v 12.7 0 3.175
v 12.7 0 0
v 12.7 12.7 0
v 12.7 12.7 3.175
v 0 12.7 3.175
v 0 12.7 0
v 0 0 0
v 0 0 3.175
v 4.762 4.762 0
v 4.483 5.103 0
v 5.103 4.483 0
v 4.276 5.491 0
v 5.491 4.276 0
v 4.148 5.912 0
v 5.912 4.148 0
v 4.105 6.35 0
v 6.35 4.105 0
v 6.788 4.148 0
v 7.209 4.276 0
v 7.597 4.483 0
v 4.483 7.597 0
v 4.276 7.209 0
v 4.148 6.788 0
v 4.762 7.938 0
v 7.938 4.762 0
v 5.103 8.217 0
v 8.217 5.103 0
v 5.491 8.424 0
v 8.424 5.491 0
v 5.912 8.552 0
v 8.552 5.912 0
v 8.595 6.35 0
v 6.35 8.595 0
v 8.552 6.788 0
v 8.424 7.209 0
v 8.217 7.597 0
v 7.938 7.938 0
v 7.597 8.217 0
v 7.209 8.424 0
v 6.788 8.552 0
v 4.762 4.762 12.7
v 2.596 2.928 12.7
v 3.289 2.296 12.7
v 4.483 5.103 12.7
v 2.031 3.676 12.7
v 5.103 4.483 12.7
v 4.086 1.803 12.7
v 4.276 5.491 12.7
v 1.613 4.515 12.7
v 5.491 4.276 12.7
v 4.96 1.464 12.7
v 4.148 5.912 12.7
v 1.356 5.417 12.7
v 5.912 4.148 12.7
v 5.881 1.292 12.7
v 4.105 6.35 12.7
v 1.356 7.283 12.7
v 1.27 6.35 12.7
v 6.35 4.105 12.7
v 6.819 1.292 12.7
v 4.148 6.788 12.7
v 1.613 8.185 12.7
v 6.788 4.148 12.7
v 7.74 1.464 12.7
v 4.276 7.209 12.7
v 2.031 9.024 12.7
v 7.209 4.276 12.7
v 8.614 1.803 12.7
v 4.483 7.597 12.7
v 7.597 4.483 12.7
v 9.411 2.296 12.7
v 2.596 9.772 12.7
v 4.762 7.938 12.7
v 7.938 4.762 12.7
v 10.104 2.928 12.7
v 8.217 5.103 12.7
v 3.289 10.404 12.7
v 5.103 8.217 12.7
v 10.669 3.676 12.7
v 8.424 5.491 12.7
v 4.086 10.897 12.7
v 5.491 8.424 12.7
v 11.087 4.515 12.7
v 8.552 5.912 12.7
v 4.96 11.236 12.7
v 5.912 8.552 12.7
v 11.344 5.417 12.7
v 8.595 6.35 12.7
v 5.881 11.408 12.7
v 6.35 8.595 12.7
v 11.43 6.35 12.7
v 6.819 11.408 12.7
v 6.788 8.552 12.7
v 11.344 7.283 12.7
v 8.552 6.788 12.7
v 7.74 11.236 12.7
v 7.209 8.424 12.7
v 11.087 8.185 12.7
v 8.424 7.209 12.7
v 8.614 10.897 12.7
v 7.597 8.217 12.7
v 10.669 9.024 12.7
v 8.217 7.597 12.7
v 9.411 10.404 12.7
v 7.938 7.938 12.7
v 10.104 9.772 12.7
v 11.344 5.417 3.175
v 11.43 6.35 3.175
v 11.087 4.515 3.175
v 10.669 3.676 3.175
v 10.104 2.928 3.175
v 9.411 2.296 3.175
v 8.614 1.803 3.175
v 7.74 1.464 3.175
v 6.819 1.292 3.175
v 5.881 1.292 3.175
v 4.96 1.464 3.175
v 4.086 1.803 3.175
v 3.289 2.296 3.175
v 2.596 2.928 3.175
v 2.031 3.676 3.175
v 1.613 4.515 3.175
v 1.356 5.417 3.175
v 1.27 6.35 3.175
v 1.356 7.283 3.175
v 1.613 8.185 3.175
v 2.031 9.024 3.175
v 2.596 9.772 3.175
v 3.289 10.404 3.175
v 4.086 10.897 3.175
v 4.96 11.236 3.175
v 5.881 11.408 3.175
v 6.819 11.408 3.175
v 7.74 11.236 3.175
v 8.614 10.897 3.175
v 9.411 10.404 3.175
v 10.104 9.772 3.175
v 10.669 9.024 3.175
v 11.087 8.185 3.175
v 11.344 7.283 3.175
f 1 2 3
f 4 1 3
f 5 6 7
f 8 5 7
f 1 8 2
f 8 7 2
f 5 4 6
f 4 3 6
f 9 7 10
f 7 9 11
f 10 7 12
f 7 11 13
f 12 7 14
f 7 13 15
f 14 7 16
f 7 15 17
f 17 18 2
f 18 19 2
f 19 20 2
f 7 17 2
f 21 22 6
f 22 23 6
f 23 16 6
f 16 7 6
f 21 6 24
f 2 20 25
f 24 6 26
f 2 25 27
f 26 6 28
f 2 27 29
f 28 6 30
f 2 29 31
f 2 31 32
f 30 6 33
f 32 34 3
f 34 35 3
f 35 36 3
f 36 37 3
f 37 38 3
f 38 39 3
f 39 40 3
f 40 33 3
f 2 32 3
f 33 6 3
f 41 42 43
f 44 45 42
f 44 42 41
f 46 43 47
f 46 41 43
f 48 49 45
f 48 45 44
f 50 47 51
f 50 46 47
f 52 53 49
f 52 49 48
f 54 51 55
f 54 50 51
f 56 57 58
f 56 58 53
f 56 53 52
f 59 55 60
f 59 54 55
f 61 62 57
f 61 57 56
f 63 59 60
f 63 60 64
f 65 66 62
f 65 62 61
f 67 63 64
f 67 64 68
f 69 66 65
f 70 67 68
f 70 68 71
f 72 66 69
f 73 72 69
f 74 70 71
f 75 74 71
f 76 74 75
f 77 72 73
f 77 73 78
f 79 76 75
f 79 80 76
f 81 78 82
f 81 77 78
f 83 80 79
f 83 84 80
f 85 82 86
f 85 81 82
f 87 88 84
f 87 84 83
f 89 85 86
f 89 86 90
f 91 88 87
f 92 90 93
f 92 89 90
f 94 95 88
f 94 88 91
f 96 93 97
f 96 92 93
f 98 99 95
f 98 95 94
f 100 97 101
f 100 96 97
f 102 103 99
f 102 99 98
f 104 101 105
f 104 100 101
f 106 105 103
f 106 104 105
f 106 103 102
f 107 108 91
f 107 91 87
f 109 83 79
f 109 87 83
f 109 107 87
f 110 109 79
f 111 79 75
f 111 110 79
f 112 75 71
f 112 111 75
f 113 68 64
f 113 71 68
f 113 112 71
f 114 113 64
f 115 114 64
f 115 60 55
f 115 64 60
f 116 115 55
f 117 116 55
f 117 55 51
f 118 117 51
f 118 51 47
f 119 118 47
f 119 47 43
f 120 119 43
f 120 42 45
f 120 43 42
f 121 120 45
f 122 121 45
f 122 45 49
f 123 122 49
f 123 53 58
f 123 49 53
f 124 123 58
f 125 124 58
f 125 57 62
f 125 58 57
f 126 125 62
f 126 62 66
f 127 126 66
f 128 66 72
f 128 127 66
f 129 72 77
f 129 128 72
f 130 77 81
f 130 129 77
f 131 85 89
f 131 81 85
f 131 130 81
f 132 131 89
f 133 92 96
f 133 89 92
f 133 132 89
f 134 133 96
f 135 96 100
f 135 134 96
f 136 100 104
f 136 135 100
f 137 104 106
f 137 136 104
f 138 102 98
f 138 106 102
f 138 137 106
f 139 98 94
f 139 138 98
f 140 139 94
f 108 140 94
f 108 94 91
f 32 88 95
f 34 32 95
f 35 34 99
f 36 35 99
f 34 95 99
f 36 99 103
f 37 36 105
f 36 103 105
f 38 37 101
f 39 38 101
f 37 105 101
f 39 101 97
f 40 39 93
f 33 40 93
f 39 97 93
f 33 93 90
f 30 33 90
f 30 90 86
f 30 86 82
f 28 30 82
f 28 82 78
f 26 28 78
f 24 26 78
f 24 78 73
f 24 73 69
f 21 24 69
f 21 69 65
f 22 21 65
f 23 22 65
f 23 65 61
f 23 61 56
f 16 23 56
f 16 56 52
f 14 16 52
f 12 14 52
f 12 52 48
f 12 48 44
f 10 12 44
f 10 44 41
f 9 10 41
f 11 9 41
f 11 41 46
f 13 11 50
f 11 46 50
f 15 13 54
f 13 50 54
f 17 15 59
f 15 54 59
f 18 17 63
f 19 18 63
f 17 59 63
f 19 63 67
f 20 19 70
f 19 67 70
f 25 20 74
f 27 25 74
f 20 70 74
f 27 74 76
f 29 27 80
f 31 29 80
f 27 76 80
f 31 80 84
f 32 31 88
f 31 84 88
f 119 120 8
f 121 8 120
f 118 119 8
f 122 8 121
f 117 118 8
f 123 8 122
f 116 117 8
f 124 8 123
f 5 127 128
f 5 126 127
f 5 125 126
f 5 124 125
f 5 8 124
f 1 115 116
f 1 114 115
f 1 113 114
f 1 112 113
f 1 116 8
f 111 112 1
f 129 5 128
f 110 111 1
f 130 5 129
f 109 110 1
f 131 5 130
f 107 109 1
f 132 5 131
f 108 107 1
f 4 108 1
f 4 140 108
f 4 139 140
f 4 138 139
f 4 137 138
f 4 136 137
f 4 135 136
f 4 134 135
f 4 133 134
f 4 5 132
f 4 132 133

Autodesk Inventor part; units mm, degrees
ref_plane "YZ Plane" through (0, 0, 0) normal (1, 0, 0) x (0, 1, 0)
ref_plane "XZ Plane" through (0, 0, 0) normal (0, 1, 0) x (-1, 0, 0)
ref_plane "XY Plane" through (0, 0, 0) normal (0, 0, 1) x (1, 0, 0)
sketch "Sketch1" plane through (0, 0, 0) normal (0, 0, 1) x (1, 0, 0)
  line L0 (0, 0) -> (12.7, 0)
  line L1 (12.7, 0) -> (12.7, 12.7)
  line L2 (12.7, 12.7) -> (0, 12.7)
  line L3 (0, 12.7) -> (0, 0)
  circle A0 centre (6.35, 6.35) radius 5.08
  dimension "d0" = 12.7
  dimension "d1" = 12.7
  dimension "d2" = 10.16
extrude "Extrusion1" add sketch "Sketch1" along normal blind 3.175
extrude "Extrusion2" add sketch "Sketch1" along normal blind 12.7 contours A0
sketch "Sketch2" plane through (6.35, 6.35, 12.7) normal (0, 0, 1) x (1, 0, 0)
  circle A0 centre (0, 0) radius 2.2451
  point P0 (-6.35, -6.35)
extrude "Extrusion3" cut sketch "Sketch2" against normal blind 25.4
properties part number "TestPart1"
